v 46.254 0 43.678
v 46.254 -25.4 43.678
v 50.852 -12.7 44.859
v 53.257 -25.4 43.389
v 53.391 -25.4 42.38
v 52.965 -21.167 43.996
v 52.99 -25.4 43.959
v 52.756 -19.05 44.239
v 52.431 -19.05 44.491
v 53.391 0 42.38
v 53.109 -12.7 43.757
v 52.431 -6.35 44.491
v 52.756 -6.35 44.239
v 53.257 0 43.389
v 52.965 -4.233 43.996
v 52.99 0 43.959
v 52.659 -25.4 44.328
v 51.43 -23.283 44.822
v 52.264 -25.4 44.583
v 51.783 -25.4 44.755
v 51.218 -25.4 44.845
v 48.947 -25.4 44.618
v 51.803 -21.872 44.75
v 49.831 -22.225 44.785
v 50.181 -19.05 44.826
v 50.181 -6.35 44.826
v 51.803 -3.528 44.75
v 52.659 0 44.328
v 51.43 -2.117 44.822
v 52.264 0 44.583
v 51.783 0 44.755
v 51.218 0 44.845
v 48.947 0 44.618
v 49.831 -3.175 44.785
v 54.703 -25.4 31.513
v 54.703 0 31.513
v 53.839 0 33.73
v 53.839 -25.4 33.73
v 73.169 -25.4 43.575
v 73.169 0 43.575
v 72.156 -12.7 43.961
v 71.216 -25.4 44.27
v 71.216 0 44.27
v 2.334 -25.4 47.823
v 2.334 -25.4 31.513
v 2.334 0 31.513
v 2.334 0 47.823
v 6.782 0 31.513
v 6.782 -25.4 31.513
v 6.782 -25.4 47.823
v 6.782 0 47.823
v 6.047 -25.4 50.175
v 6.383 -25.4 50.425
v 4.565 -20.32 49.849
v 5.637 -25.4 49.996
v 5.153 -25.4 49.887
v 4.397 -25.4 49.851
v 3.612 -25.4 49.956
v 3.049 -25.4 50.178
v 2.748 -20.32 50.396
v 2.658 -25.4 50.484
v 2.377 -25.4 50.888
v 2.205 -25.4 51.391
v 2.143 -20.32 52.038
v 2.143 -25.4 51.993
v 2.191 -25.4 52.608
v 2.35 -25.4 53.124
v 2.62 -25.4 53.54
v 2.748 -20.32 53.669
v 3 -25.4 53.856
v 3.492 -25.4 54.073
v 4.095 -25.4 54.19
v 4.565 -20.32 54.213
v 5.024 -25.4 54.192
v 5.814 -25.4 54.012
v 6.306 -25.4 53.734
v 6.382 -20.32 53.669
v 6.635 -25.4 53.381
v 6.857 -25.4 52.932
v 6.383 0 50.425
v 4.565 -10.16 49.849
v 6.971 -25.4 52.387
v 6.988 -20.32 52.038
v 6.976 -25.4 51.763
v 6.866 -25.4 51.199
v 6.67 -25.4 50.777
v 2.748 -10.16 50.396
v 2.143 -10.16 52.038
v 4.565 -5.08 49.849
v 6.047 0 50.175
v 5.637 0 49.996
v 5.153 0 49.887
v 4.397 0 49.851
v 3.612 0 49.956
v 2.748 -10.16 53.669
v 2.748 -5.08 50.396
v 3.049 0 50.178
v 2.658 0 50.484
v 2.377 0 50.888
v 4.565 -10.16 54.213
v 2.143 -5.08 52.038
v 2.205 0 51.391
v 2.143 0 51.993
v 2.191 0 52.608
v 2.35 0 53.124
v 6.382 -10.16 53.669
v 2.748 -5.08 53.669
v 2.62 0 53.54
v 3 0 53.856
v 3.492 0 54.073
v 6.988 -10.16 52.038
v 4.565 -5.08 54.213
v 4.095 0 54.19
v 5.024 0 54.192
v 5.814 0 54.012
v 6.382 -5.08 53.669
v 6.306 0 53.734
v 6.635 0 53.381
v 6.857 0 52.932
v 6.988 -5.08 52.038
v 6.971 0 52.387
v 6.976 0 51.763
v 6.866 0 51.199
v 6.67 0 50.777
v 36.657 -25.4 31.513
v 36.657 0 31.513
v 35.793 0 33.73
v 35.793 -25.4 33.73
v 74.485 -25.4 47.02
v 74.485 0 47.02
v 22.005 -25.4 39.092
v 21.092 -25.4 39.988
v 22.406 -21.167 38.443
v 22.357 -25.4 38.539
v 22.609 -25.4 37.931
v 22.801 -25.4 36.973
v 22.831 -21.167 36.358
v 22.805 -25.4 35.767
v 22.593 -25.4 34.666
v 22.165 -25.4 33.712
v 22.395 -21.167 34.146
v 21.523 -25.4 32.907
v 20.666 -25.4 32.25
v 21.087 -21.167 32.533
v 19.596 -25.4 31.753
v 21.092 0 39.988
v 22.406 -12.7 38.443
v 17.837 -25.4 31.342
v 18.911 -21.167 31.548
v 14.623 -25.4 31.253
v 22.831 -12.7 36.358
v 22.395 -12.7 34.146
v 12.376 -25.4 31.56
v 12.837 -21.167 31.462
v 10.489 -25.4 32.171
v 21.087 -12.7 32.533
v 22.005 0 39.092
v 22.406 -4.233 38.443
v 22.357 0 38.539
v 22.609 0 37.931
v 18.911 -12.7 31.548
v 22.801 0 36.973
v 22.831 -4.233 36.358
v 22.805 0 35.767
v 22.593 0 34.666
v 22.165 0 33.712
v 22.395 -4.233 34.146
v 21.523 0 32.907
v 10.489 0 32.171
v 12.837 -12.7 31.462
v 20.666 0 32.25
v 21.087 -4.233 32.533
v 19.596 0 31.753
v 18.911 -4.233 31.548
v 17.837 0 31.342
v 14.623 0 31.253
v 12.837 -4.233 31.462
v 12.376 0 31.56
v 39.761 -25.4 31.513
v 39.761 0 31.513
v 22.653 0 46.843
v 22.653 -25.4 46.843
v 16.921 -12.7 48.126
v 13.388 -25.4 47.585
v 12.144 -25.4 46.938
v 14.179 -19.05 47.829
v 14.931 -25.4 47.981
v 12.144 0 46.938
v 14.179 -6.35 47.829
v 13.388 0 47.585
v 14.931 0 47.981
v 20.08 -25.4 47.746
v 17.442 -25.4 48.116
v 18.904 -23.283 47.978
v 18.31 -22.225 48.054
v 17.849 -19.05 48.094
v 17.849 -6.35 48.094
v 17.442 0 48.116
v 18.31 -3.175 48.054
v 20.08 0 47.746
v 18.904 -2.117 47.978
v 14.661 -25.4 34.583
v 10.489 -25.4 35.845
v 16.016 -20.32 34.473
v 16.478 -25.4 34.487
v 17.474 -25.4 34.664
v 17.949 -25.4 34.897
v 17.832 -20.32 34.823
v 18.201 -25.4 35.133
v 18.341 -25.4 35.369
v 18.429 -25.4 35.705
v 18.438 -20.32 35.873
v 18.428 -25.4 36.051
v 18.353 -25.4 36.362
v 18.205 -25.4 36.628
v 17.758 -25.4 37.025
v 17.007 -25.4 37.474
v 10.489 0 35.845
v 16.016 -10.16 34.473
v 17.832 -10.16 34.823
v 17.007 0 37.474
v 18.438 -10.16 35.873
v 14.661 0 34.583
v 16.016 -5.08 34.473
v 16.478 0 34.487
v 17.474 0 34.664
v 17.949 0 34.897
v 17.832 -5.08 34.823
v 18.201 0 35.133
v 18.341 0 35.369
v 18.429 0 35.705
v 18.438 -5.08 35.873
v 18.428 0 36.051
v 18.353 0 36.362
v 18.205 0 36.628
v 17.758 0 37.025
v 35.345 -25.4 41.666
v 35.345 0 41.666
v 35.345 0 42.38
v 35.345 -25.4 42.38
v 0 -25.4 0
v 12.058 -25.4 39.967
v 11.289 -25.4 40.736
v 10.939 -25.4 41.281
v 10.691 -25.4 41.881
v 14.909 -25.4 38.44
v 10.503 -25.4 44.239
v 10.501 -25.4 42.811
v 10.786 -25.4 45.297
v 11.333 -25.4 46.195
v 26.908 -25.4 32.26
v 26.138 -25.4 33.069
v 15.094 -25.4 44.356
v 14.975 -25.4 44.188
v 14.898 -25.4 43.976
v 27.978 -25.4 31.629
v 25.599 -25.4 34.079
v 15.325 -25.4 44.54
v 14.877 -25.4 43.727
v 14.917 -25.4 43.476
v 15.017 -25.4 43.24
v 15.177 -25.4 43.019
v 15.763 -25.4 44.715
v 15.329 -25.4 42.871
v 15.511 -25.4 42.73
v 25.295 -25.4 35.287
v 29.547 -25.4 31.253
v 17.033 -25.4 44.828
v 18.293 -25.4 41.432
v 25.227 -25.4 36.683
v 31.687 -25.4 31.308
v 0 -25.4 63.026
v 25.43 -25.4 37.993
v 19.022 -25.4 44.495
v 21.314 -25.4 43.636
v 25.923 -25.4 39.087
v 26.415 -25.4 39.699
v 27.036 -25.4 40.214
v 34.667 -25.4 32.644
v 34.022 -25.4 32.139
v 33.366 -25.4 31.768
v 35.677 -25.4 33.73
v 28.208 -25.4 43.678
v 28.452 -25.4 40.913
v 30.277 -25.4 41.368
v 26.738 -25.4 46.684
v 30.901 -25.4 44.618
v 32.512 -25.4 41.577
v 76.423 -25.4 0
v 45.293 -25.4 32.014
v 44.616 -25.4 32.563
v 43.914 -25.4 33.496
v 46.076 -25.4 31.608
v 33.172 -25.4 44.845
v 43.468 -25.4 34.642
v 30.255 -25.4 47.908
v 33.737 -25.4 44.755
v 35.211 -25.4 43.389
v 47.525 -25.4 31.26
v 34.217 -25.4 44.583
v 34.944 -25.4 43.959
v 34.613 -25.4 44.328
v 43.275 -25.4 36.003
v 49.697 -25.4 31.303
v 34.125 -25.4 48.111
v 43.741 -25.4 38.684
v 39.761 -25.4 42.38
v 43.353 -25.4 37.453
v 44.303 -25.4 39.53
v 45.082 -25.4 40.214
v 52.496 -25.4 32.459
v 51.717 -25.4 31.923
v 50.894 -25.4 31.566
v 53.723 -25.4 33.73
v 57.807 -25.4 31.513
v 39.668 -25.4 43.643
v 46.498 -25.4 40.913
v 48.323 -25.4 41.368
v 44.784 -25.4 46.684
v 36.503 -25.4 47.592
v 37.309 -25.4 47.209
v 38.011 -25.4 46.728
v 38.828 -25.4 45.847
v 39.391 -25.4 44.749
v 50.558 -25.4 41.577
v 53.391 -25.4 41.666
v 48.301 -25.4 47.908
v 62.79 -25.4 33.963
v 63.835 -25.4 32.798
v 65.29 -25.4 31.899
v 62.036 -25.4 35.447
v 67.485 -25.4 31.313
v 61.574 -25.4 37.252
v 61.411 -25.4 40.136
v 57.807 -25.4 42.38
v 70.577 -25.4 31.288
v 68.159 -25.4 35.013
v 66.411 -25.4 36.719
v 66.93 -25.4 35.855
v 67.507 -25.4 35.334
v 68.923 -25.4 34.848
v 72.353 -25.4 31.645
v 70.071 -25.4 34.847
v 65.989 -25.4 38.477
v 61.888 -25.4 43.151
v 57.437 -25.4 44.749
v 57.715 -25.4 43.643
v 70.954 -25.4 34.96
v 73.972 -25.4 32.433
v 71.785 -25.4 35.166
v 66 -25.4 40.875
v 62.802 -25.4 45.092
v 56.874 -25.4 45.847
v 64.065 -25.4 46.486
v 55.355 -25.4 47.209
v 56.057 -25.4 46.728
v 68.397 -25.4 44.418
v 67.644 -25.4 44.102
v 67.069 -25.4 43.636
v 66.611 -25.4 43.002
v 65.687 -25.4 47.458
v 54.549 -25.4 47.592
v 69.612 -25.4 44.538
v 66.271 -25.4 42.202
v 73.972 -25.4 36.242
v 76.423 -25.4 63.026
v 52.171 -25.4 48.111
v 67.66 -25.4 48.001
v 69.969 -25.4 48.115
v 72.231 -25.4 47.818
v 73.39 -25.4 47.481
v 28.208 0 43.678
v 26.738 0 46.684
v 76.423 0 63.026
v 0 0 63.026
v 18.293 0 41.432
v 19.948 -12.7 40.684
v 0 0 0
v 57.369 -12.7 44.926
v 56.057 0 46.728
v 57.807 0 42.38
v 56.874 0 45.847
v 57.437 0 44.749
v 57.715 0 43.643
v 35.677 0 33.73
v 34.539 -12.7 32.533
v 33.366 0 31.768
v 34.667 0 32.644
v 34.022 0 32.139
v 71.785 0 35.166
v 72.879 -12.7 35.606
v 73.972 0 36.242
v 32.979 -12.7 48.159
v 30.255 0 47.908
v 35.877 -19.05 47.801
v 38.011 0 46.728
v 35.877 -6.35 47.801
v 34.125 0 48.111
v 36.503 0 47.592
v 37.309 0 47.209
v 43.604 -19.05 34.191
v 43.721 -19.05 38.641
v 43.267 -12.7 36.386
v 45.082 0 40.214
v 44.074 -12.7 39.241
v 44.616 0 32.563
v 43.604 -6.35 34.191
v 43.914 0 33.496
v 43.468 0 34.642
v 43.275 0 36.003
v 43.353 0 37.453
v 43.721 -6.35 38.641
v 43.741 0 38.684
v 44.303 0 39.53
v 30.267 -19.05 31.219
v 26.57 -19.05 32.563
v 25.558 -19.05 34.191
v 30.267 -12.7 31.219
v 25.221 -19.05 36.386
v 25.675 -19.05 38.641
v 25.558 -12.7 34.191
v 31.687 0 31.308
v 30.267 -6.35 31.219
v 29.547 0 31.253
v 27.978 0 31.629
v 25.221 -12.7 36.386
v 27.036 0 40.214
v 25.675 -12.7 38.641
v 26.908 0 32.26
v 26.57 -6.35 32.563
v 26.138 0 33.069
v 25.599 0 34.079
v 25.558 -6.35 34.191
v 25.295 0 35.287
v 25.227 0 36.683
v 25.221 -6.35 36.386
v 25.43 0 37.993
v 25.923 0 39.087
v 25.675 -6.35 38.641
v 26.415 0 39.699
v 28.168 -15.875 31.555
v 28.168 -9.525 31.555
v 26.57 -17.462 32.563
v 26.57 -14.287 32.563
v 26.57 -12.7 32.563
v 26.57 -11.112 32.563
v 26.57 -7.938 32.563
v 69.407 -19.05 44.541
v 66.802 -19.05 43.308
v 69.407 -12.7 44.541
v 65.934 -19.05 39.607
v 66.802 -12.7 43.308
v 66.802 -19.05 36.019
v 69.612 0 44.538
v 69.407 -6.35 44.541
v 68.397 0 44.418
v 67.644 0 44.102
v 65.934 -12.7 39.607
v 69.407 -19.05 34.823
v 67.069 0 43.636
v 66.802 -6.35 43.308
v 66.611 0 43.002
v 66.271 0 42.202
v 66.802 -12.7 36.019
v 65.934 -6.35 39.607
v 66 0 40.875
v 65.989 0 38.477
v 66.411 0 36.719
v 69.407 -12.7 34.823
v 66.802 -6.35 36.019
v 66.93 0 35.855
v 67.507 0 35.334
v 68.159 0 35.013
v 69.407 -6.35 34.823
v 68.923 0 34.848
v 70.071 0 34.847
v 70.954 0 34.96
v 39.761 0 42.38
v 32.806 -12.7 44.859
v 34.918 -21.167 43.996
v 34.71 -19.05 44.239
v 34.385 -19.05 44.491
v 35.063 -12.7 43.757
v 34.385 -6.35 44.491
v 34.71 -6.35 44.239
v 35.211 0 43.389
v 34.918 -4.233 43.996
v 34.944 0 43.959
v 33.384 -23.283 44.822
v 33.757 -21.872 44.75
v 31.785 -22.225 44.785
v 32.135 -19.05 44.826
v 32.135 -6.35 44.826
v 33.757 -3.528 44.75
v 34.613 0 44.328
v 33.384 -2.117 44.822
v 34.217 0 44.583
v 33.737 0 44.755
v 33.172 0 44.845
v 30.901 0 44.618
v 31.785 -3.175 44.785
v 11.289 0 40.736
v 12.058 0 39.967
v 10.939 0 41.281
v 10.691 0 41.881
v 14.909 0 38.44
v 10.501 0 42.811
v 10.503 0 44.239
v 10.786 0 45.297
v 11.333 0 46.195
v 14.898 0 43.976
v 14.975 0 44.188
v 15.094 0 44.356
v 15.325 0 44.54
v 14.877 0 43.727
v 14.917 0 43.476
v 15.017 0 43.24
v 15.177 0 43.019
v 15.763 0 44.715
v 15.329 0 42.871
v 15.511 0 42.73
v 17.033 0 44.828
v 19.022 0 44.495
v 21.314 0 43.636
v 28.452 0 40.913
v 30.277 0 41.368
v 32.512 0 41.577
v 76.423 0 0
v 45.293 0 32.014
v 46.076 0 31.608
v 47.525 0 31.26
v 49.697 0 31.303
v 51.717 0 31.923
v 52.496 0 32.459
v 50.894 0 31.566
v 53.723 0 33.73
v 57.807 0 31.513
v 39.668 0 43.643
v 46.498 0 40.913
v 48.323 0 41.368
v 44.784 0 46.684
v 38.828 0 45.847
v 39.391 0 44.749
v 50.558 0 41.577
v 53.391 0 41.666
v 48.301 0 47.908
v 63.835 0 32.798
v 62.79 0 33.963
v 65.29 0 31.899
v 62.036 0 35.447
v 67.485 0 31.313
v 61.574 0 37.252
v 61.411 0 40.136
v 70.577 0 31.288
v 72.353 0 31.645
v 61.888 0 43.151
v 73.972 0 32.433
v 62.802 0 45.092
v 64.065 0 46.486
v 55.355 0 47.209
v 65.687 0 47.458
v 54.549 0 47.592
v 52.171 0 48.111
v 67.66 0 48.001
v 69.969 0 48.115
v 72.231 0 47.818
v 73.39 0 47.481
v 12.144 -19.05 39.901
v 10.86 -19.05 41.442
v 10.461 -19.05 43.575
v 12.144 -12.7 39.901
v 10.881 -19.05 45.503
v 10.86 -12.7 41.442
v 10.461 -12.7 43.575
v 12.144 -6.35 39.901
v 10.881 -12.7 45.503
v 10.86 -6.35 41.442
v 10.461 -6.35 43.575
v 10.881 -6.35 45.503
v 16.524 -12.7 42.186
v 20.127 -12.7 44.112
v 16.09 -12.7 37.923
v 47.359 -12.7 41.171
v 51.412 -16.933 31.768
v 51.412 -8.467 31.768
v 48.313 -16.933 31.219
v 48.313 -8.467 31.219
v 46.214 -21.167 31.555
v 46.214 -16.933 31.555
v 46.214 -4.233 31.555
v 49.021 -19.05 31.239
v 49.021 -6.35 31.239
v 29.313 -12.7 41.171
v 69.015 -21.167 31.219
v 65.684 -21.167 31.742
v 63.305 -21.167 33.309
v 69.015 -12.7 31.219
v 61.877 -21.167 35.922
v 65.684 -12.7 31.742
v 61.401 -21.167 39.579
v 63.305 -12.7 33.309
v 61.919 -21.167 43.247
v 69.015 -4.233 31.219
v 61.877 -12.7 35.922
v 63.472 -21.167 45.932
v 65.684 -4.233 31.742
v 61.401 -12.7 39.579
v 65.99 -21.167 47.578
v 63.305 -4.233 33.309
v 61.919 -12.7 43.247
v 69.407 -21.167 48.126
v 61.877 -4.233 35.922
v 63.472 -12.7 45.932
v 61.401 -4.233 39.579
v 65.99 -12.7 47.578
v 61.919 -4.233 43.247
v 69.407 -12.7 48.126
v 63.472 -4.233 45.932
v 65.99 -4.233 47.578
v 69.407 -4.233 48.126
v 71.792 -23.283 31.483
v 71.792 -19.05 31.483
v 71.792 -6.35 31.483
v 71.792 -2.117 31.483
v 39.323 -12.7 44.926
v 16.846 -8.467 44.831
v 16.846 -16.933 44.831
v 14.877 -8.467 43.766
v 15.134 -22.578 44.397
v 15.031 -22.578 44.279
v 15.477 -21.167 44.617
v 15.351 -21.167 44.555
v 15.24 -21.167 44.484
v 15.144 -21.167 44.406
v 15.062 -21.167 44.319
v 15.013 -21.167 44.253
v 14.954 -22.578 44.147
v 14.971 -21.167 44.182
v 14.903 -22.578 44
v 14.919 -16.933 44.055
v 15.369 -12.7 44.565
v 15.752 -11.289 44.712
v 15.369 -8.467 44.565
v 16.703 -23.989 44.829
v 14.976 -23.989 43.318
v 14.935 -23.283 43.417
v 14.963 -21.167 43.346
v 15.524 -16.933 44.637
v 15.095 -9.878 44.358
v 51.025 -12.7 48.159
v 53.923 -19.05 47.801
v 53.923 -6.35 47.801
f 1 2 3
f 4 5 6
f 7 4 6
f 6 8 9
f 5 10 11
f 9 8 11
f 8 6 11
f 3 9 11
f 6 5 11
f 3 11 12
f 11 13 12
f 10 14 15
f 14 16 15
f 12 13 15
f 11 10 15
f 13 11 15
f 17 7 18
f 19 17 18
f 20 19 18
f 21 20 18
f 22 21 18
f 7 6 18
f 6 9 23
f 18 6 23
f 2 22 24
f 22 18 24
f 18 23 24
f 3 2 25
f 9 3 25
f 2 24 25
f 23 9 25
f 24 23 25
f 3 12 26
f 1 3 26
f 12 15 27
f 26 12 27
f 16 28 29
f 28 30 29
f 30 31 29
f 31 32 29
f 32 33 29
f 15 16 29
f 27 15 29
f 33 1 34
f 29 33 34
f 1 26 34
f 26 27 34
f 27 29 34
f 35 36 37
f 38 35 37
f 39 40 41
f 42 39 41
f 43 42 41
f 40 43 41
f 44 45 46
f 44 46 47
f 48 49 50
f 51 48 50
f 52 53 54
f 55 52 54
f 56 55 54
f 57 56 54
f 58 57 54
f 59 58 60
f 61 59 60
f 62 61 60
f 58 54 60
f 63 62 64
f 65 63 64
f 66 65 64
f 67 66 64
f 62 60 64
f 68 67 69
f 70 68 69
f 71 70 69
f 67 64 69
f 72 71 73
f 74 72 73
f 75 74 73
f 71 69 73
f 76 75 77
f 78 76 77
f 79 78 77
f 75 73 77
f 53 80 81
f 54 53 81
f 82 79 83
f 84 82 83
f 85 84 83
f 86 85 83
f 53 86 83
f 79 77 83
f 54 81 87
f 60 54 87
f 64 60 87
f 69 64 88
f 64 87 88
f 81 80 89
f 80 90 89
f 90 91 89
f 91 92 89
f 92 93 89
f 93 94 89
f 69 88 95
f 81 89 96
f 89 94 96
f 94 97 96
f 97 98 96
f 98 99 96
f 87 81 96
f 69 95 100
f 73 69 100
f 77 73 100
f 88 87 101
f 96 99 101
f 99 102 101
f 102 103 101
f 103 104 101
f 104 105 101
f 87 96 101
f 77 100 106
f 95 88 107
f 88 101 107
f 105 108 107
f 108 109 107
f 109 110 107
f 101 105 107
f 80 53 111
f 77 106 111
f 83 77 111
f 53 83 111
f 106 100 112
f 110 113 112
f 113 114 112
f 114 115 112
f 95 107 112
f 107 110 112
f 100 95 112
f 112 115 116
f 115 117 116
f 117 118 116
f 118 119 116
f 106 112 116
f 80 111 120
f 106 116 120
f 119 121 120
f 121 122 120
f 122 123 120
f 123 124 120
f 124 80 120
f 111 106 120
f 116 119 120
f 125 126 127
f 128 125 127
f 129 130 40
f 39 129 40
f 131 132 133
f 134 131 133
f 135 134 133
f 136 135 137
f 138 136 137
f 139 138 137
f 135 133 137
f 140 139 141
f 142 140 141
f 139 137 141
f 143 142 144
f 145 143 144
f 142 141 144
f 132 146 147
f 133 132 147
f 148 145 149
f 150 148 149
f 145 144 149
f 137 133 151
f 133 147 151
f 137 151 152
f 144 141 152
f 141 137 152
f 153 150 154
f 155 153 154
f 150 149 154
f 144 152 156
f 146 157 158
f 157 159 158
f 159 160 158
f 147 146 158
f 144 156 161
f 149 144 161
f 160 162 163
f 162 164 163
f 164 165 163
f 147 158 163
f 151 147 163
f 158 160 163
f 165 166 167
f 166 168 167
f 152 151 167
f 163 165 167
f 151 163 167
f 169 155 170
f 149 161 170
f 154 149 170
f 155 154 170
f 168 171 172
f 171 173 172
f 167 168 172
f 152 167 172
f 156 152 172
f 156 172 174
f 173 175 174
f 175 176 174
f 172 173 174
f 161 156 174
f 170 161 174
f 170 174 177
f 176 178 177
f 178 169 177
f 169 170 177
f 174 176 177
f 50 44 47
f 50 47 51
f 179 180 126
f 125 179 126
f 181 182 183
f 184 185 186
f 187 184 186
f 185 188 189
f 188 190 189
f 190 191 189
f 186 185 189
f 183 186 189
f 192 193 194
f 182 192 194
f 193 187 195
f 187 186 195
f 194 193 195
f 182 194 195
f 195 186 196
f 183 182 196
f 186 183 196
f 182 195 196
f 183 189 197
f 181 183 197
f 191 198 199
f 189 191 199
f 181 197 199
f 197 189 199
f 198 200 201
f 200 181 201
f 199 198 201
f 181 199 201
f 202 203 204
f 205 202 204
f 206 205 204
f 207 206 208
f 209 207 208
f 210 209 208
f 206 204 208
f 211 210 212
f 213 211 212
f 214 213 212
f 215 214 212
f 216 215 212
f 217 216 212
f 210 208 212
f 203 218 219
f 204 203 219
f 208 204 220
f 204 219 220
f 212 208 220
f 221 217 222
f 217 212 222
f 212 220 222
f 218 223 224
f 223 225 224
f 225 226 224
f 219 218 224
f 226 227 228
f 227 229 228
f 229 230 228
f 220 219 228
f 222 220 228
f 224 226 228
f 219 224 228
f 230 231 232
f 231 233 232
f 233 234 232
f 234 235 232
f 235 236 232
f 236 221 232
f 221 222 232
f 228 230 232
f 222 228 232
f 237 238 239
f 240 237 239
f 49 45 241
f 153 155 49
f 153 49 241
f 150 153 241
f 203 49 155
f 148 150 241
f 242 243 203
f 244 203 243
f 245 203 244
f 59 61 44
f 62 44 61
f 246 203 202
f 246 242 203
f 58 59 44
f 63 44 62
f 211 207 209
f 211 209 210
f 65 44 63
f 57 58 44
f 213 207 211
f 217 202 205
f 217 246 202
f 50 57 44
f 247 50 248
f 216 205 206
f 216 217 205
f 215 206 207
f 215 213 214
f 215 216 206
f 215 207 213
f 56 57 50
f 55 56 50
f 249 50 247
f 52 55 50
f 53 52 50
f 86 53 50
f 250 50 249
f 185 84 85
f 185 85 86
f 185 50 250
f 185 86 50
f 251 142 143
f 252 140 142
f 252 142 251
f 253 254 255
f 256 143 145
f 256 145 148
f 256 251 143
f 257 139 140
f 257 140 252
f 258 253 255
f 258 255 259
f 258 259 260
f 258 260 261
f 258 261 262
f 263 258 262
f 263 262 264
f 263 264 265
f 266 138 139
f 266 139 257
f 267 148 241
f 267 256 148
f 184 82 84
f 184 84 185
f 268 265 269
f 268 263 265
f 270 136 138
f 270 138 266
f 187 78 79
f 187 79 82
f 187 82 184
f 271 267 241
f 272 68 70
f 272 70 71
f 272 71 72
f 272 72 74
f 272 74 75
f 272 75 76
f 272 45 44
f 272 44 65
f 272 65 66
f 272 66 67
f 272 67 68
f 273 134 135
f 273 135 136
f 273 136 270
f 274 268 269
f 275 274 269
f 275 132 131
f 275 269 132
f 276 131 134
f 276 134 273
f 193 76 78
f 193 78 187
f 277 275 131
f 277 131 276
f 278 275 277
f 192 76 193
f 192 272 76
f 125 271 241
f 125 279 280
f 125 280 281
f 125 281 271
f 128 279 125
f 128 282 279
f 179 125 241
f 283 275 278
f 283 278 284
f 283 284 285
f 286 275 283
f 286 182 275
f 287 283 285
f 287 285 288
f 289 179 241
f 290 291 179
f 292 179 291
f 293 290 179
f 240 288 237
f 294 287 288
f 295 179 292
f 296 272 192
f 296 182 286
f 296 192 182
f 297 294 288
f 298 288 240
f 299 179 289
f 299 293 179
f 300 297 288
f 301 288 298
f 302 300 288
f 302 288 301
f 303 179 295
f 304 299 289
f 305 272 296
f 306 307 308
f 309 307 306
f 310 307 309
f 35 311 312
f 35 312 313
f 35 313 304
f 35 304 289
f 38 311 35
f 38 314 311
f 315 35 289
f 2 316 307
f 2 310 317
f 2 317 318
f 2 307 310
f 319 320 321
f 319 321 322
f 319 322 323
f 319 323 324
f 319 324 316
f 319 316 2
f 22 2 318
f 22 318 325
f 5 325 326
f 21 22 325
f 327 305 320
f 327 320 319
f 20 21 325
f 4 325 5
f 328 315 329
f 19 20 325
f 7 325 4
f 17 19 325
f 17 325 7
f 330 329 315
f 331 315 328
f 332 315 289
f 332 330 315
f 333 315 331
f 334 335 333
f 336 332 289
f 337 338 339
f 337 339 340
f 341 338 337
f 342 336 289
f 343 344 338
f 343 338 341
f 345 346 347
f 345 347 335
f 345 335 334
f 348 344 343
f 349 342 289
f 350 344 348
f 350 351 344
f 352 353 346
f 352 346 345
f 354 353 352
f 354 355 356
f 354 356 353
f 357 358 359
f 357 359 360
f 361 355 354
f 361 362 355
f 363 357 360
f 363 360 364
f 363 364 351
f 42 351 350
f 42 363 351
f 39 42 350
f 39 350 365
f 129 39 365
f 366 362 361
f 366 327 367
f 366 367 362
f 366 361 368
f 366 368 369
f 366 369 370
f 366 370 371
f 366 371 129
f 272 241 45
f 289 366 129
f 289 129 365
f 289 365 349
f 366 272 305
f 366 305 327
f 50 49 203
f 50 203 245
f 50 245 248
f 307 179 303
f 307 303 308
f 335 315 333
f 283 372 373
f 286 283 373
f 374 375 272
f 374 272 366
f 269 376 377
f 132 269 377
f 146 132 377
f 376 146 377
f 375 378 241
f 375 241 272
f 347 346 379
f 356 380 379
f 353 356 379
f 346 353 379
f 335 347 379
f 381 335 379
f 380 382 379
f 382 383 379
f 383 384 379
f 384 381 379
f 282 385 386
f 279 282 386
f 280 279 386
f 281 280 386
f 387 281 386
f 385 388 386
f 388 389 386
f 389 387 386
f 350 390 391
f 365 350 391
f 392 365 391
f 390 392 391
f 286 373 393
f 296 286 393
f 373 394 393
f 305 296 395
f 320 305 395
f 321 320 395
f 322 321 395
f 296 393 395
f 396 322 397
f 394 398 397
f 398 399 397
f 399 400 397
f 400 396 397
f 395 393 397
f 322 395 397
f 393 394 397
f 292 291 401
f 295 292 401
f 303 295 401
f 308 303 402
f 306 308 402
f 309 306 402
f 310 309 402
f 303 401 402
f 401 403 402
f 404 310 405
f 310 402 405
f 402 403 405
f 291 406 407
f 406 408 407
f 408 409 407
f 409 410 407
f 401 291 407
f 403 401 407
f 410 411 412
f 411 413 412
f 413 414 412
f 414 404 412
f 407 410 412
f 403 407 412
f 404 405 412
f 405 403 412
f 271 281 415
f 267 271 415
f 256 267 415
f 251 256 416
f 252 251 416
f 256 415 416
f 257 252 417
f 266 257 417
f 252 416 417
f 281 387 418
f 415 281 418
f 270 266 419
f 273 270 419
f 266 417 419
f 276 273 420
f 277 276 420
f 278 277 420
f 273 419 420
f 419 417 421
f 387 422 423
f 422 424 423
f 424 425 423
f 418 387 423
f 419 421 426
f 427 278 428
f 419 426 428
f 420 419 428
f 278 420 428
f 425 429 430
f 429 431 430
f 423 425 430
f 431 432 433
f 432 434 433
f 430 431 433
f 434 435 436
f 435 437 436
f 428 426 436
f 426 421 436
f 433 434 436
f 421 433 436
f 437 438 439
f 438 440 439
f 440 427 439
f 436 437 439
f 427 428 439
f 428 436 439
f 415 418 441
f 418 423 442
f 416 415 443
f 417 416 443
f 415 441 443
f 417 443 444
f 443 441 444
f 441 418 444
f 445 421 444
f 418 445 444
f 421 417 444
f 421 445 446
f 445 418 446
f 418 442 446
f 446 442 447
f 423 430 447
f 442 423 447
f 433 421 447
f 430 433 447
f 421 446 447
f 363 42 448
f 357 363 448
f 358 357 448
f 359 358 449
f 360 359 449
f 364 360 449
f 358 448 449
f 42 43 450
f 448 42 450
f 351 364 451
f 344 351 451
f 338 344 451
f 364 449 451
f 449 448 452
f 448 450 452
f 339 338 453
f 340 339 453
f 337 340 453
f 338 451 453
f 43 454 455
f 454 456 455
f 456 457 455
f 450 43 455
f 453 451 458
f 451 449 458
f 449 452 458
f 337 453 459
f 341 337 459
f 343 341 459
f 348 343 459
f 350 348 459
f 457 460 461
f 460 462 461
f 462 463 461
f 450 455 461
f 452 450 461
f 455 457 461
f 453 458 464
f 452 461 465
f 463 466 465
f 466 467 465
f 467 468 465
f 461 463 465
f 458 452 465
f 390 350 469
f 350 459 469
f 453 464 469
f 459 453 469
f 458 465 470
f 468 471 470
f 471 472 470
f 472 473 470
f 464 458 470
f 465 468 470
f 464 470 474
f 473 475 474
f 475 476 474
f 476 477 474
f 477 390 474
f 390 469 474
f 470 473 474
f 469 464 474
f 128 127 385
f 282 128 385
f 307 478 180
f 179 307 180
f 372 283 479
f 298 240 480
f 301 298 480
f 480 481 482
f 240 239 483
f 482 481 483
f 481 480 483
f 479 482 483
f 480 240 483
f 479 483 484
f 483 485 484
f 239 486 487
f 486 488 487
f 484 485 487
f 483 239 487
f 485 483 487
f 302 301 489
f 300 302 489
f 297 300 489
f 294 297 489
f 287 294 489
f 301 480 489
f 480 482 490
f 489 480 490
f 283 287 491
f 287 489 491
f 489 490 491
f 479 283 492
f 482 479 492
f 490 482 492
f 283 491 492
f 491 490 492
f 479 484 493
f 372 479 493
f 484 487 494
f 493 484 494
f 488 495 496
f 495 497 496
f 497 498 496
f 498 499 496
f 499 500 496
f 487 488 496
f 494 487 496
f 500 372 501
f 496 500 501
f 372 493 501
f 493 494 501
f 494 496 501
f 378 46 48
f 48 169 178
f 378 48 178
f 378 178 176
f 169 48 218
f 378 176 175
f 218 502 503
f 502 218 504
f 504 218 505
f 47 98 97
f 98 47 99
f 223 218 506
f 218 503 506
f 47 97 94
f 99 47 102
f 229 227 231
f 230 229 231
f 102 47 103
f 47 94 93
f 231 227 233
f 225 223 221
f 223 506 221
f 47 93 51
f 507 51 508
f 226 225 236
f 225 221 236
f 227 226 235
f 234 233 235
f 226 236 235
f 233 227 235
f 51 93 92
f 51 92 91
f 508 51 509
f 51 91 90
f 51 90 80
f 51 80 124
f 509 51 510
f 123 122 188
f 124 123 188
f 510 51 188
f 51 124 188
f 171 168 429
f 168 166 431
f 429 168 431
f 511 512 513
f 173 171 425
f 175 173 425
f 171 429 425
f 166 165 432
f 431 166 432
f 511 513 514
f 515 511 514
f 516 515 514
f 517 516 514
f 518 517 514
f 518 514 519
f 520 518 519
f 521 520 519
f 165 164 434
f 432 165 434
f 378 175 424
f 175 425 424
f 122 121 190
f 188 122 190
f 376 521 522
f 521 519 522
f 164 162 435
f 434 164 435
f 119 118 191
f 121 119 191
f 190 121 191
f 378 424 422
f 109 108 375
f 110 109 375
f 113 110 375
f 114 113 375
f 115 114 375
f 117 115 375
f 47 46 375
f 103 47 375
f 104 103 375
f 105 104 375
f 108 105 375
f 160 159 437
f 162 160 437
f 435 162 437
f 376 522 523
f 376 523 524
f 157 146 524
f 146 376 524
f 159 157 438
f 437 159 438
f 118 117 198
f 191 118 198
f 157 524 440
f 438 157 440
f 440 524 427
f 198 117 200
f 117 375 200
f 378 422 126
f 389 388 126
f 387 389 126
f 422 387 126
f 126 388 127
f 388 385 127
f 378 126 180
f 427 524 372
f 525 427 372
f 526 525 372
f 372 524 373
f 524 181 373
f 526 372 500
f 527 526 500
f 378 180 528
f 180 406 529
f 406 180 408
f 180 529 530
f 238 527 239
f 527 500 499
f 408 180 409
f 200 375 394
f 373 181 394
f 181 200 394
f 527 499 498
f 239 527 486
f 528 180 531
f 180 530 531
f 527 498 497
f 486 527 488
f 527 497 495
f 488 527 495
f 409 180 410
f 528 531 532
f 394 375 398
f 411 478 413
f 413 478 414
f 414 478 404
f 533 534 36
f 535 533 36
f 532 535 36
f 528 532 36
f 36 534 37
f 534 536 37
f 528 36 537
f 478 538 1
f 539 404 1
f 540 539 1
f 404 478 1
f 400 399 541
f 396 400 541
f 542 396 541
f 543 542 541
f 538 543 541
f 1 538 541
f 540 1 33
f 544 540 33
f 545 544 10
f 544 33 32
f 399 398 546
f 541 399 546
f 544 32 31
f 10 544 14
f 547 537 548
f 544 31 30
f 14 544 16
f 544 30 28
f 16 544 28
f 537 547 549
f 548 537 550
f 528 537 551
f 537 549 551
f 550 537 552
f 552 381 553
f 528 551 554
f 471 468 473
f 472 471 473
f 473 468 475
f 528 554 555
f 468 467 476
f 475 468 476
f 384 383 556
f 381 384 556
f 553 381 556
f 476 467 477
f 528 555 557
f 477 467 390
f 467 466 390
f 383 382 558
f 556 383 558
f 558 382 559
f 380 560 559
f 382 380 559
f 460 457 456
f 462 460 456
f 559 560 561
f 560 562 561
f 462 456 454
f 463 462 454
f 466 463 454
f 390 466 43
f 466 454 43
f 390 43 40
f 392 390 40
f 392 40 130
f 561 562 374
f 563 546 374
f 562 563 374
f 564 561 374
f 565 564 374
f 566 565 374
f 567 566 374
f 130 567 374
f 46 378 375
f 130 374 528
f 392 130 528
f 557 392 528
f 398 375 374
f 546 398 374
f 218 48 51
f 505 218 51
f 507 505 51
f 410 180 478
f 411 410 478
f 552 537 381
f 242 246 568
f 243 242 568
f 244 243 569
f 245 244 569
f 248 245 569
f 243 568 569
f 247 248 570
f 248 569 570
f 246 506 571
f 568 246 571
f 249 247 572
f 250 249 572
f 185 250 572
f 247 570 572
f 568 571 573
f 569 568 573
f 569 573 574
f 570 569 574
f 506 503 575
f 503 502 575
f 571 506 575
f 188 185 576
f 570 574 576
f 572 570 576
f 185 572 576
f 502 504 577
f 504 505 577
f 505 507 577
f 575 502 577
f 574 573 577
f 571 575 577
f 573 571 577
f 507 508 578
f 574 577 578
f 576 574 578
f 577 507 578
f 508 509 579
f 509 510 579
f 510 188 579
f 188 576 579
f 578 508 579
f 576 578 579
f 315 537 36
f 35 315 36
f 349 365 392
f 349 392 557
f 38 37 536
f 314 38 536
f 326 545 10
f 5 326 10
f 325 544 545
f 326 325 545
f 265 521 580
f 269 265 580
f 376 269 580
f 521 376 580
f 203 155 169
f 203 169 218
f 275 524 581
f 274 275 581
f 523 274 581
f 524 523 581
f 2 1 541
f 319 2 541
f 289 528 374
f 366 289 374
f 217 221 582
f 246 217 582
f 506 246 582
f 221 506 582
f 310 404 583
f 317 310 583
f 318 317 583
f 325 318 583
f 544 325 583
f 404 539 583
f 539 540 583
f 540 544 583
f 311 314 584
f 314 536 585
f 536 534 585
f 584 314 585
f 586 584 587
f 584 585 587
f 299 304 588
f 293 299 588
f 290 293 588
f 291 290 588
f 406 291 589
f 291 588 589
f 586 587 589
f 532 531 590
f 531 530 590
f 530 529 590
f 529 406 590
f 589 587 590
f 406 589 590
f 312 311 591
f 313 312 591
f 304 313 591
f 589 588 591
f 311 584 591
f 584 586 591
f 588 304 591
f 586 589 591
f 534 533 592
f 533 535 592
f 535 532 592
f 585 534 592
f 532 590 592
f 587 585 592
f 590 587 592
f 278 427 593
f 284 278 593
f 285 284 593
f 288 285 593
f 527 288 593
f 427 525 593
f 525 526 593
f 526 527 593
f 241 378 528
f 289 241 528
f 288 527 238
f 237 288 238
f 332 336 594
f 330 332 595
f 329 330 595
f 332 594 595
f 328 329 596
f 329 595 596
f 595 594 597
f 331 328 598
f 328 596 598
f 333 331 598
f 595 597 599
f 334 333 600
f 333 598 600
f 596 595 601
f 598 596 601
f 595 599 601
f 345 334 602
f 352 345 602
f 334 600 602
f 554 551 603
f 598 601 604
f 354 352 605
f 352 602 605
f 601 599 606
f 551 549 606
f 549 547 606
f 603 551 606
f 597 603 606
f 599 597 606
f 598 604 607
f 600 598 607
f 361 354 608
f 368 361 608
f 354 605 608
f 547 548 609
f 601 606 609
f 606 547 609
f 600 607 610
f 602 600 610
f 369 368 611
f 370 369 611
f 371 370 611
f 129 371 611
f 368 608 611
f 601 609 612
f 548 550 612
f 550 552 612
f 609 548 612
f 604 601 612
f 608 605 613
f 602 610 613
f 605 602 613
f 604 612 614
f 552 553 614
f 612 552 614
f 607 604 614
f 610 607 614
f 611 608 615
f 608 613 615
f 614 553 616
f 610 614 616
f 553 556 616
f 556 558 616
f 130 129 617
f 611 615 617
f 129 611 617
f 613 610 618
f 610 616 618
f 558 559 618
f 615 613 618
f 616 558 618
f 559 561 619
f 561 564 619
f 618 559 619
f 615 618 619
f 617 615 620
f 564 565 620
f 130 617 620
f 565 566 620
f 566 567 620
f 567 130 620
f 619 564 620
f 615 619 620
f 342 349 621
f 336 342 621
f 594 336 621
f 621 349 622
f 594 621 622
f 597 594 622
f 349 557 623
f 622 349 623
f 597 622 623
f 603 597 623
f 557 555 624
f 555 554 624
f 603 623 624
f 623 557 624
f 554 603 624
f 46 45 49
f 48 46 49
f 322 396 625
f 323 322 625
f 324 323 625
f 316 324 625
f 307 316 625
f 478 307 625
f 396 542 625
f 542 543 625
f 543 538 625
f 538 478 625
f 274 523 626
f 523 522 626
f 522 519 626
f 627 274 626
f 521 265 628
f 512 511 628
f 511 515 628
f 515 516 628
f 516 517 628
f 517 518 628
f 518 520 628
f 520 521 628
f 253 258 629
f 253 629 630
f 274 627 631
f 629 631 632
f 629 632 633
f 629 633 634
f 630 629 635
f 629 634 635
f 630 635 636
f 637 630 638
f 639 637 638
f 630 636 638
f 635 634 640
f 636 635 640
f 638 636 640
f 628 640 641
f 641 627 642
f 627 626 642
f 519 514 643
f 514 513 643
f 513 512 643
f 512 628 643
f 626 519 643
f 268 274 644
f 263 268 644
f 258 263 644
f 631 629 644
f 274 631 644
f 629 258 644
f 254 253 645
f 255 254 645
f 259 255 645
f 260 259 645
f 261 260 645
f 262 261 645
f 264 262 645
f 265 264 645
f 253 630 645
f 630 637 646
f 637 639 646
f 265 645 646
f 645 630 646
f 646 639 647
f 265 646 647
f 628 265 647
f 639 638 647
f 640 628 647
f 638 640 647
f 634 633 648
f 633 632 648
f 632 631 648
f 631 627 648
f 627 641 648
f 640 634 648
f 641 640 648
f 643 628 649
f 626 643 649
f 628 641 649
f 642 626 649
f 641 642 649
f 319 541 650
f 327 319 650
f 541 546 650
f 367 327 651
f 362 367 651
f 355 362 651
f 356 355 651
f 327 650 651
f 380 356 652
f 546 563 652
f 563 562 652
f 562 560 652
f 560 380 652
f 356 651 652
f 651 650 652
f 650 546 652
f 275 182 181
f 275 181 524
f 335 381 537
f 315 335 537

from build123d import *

# Parameters (mm, degrees)
F0_W     = 76.4226376876
F0_H     = 63.0263250266
F0_W_2   = 4.4484958292
F0_H_2   = 16.3095954117
F1_DEPTH = 25.4


with BuildPart() as f1:
    # F0 (on Front) → F1 (new body)
    with BuildSketch(Plane.XZ):
        with Locations((38.2113188438, 31.5131625133)):
            Rectangle(F0_W, F0_H)
        with Locations((4.5581911619, 39.6679602192)):
            Rectangle(F0_W_2, F0_H_2, mode=Mode.SUBTRACT)
        with BuildLine():
            add(Edge.make_bspline(
                [(22.4058551735, 38.4426400144), (22.8306328445, 37.5674112967), (22.8306328445, 36.3584286946)],
                knots=[0, 0, 0, 1, 1, 1], degree=2))
            add(Edge.make_bspline(
                [(22.8306328445, 36.3584286946), (22.8306328445, 33.8471057606), (21.0871772388, 32.5330957124)],
                knots=[0, 0, 0, 1, 1, 1], degree=2))
            add(Edge.make_bspline(
                [(21.0871772388, 32.5330957124), (19.3437216331, 31.2190856642), (15.8708140812, 31.2190856642)],
                knots=[0, 0, 0, 1, 1, 1], degree=2))
            add(Edge.make_bspline(
                [(15.8708140812, 31.2190856642), (14.0923493268, 31.2190856642), (12.8366878598, 31.4618157619)],
                knots=[0, 0, 0, 1, 1, 1], degree=2))
            add(Edge.make_bspline(
                [(12.8366878598, 31.4618157619), (11.5810263928, 31.7045458596), (10.4887409531, 32.171334509)],
                knots=[0, 0, 0, 1, 1, 1], degree=2))
            Line((10.4887409531, 32.171334509), (10.4887409531, 35.8449611802))
            add(Edge.make_bspline(
                [(10.4887409531, 35.8449611802), (11.7257308741, 35.2614753684), (13.2801370768, 34.8670389596)],
                knots=[0, 0, 0, 1, 1, 1], degree=2))
            add(Edge.make_bspline(
                [(13.2801370768, 34.8670389596), (14.8345432795, 34.4726025508), (16.0155185626, 34.4726025508)],
                knots=[0, 0, 0, 1, 1, 1], degree=2))
            add(Edge.make_bspline(
                [(16.0155185626, 34.4726025508), (18.4381516532, 34.4726025508), (18.4381516532, 35.8729684992)],
                knots=[0, 0, 0, 1, 1, 1], degree=2))
            add(Edge.make_bspline(
                [(18.4381516532, 35.8729684992), (18.4381516532, 36.400439673), (18.1160674851, 36.7295256709)],
                knots=[0, 0, 0, 1, 1, 1], degree=2))
            add(Edge.make_bspline(
                [(18.1160674851, 36.7295256709), (17.793983317, 37.0586116688), (17.0074444426, 37.4740535668)],
                knots=[0, 0, 0, 1, 1, 1], degree=2))
            add(Edge.make_bspline(
                [(17.0074444426, 37.4740535668), (16.2209055683, 37.8894954648), (14.9092294634, 38.4403060711)],
                knots=[0, 0, 0, 1, 1, 1], degree=2))
            add(Edge.make_bspline(
                [(14.9092294634, 38.4403060711), (13.0280712061, 39.2291788887), (12.1435067154, 39.9013545439)],
                knots=[0, 0, 0, 1, 1, 1], degree=2))
            add(Edge.make_bspline(
                [(12.1435067154, 39.9013545439), (11.2589422247, 40.5735301991), (10.8598379294, 41.4417570871)],
                knots=[0, 0, 0, 1, 1, 1], degree=2))
            add(Edge.make_bspline(
                [(10.8598379294, 41.4417570871), (10.4607336341, 42.3099839751), (10.4607336341, 43.5749812151)],
                knots=[0, 0, 0, 1, 1, 1], degree=2))
            add(Edge.make_bspline(
                [(10.4607336341, 43.5749812151), (10.4607336341, 45.7502163215), (12.1435067154, 46.9381934343)],
                knots=[0, 0, 0, 1, 1, 1], degree=2))
            add(Edge.make_bspline(
                [(12.1435067154, 46.9381934343), (13.8262797967, 48.1261705472), (16.9210885425, 48.1261705472)],
                knots=[0, 0, 0, 1, 1, 1], degree=2))
            add(Edge.make_bspline(
                [(16.9210885425, 48.1261705472), (19.8665249205, 48.1261705472), (22.6532531577, 46.8425017612)],
                knots=[0, 0, 0, 1, 1, 1], degree=2))
            Line((22.6532531577, 46.8425017612), (21.3135697338, 43.6356637395))
            add(Edge.make_bspline(
                [(21.3135697338, 43.6356637395), (20.0859155858, 44.1584670269), (19.021637465, 44.4945548545)],
                knots=[0, 0, 0, 1, 1, 1], degree=2))
            add(Edge.make_bspline(
                [(19.021637465, 44.4945548545), (17.9573593443, 44.8306426821), (16.8464023586, 44.8306426821)],
                knots=[0, 0, 0, 1, 1, 1], degree=2))
            add(Edge.make_bspline(
                [(16.8464023586, 44.8306426821), (14.8765542579, 44.8306426821), (14.8765542579, 43.7663645613)],
                knots=[0, 0, 0, 1, 1, 1], degree=2))
            add(Edge.make_bspline(
                [(14.8765542579, 43.7663645613), (14.8765542579, 43.16887509), (15.5113868212, 42.7300937596)],
                knots=[0, 0, 0, 1, 1, 1], degree=2))
            add(Edge.make_bspline(
                [(15.5113868212, 42.7300937596), (16.1462193844, 42.2913124291), (18.2934471719, 41.4324213141)],
                knots=[0, 0, 0, 1, 1, 1], degree=2))
            add(Edge.make_bspline(
                [(18.2934471719, 41.4324213141), (20.2026127481, 40.657552156), (21.0918451253, 39.987710444)],
                knots=[0, 0, 0, 1, 1, 1], degree=2))
            add(Edge.make_bspline(
                [(21.0918451253, 39.987710444), (21.9810775025, 39.3178687321), (22.4058551735, 38.4426400144)],
                knots=[0, 0, 0, 1, 1, 1], degree=2))
        make_face(mode=Mode.SUBTRACT)
        with BuildLine():
            Line((39.76105716, 31.5131625133), (36.6569126412, 31.5131625133))
            Line((36.6569126412, 31.5131625133), (35.7933536397, 33.7304085982))
            Line((35.7933536397, 33.7304085982), (35.6766564773, 33.7304085982))
            add(Edge.make_bspline(
                [(35.6766564773, 33.7304085982), (34.5563637186, 32.3160389904), (33.3660526625, 31.7675623273)],
                knots=[0, 0, 0, 1, 1, 1], degree=2))
            add(Edge.make_bspline(
                [(33.3660526625, 31.7675623273), (32.1757416065, 31.2190856642), (30.2665760302, 31.2190856642)],
                knots=[0, 0, 0, 1, 1, 1], degree=2))
            add(Edge.make_bspline(
                [(30.2665760302, 31.2190856642), (27.9186291235, 31.2190856642), (26.5696099266, 32.5634369746)],
                knots=[0, 0, 0, 1, 1, 1], degree=2))
            add(Edge.make_bspline(
                [(26.5696099266, 32.5634369746), (25.2205907297, 33.907788285), (25.2205907297, 36.3864360136)],
                knots=[0, 0, 0, 1, 1, 1], degree=2))
            add(Edge.make_bspline(
                [(25.2205907297, 36.3864360136), (25.2205907297, 38.9817809045), (27.036398576, 40.214102939)],
                knots=[0, 0, 0, 1, 1, 1], degree=2))
            add(Edge.make_bspline(
                [(27.036398576, 40.214102939), (28.8522064224, 41.4464249736), (32.5118294341, 41.5771257954)],
                knots=[0, 0, 0, 1, 1, 1], degree=2))
            Line((32.5118294341, 41.5771257954), (35.3452365362, 41.6658156388))
            Line((35.3452365362, 41.6658156388), (35.3452365362, 42.3800022725))
            add(Edge.make_bspline(
                [(35.3452365362, 42.3800022725), (35.3452365362, 44.858650001), (32.8059062832, 44.858650001)],
                knots=[0, 0, 0, 1, 1, 1], degree=2))
            add(Edge.make_bspline(
                [(32.8059062832, 44.858650001), (30.850061842, 44.858650001), (28.2080380861, 43.6776747179)],
                knots=[0, 0, 0, 1, 1, 1], degree=2))
            Line((28.2080380861, 43.6776747179), (26.7376538404, 46.6837936204))
            add(Edge.make_bspline(
                [(26.7376538404, 46.6837936204), (29.5523893966, 48.1588457526), (32.9786180835, 48.1588457526)],
                knots=[0, 0, 0, 1, 1, 1], degree=2))
            add(Edge.make_bspline(
                [(32.9786180835, 48.1588457526), (36.2601422891, 48.1588457526), (38.0105997246, 46.7281385421)],
                knots=[0, 0, 0, 1, 1, 1], degree=2))
            add(Edge.make_bspline(
                [(38.0105997246, 46.7281385421), (39.76105716, 45.2974313315), (39.76105716, 42.3800022725)],
                knots=[0, 0, 0, 1, 1, 1], degree=2))
            Line((39.76105716, 42.3800022725), (39.76105716, 31.5131625133))
        make_face(mode=Mode.SUBTRACT)
        with BuildLine():
            add(Edge.make_bspline(
                [(4.5651929916, 49.8486206636), (2.142559901, 49.8486206636), (2.142559901, 52.0378594296)],
                knots=[0, 0, 0, 1, 1, 1], degree=2))
            add(Edge.make_bspline(
                [(2.142559901, 52.0378594296), (2.142559901, 54.213094536), (4.5651929916, 54.213094536)],
                knots=[0, 0, 0, 1, 1, 1], degree=2))
            add(Edge.make_bspline(
                [(4.5651929916, 54.213094536), (6.9878260822, 54.213094536), (6.9878260822, 52.0378594296)],
                knots=[0, 0, 0, 1, 1, 1], degree=2))
            add(Edge.make_bspline(
                [(6.9878260822, 52.0378594296), (6.9878260822, 51.0015886278), (6.3833347812, 50.4251046457)],
                knots=[0, 0, 0, 1, 1, 1], degree=2))
            add(Edge.make_bspline(
                [(6.3833347812, 50.4251046457), (5.7788434802, 49.8486206636), (4.5651929916, 49.8486206636)],
                knots=[0, 0, 0, 1, 1, 1], degree=2))
        make_face(mode=Mode.SUBTRACT)
        with BuildLine():
            Line((57.8071063477, 31.5131625133), (54.7029618288, 31.5131625133))
            Line((54.7029618288, 31.5131625133), (53.8394028273, 33.7304085982))
            Line((53.8394028273, 33.7304085982), (53.722705665, 33.7304085982))
            add(Edge.make_bspline(
                [(53.722705665, 33.7304085982), (52.6024129063, 32.3160389904), (51.4121018502, 31.7675623273)],
                knots=[0, 0, 0, 1, 1, 1], degree=2))
            add(Edge.make_bspline(
                [(51.4121018502, 31.7675623273), (50.2217907941, 31.2190856642), (48.3126252179, 31.2190856642)],
                knots=[0, 0, 0, 1, 1, 1], degree=2))
            add(Edge.make_bspline(
                [(48.3126252179, 31.2190856642), (45.9646783112, 31.2190856642), (44.6156591142, 32.5634369746)],
                knots=[0, 0, 0, 1, 1, 1], degree=2))
            add(Edge.make_bspline(
                [(44.6156591142, 32.5634369746), (43.2666399173, 33.907788285), (43.2666399173, 36.3864360136)],
                knots=[0, 0, 0, 1, 1, 1], degree=2))
            add(Edge.make_bspline(
                [(43.2666399173, 36.3864360136), (43.2666399173, 38.9817809045), (45.0824477637, 40.214102939)],
                knots=[0, 0, 0, 1, 1, 1], degree=2))
            add(Edge.make_bspline(
                [(45.0824477637, 40.214102939), (46.89825561, 41.4464249736), (50.5578786217, 41.5771257954)],
                knots=[0, 0, 0, 1, 1, 1], degree=2))
            Line((50.5578786217, 41.5771257954), (53.3912857239, 41.6658156388))
            Line((53.3912857239, 41.6658156388), (53.3912857239, 42.3800022725))
            add(Edge.make_bspline(
                [(53.3912857239, 42.3800022725), (53.3912857239, 44.858650001), (50.8519554709, 44.858650001)],
                knots=[0, 0, 0, 1, 1, 1], degree=2))
            add(Edge.make_bspline(
                [(50.8519554709, 44.858650001), (48.8961110297, 44.858650001), (46.2540872738, 43.6776747179)],
                knots=[0, 0, 0, 1, 1, 1], degree=2))
            Line((46.2540872738, 43.6776747179), (44.783703028, 46.6837936204))
            add(Edge.make_bspline(
                [(44.783703028, 46.6837936204), (47.5984385842, 48.1588457526), (51.0246672712, 48.1588457526)],
                knots=[0, 0, 0, 1, 1, 1], degree=2))
            add(Edge.make_bspline(
                [(51.0246672712, 48.1588457526), (54.3061914768, 48.1588457526), (56.0566489122, 46.7281385421)],
                knots=[0, 0, 0, 1, 1, 1], degree=2))
            add(Edge.make_bspline(
                [(56.0566489122, 46.7281385421), (57.8071063477, 45.2974313315), (57.8071063477, 42.3800022725)],
                knots=[0, 0, 0, 1, 1, 1], degree=2))
            Line((57.8071063477, 42.3800022725), (57.8071063477, 31.5131625133))
        make_face(mode=Mode.SUBTRACT)
        with BuildLine():
            add(Edge.make_bspline(
                [(71.7920942851, 31.4828212511), (70.6904730724, 31.2190856642), (69.0147018209, 31.2190856642)],
                knots=[0, 0, 0, 1, 1, 1], degree=2))
            add(Edge.make_bspline(
                [(69.0147018209, 31.2190856642), (61.4013789484, 31.2190856642), (61.4013789484, 39.5792703758)],
                knots=[0, 0, 0, 1, 1, 1], degree=2))
            add(Edge.make_bspline(
                [(61.4013789484, 39.5792703758), (61.4013789484, 43.7383572424), (63.4715866087, 45.9322638948)],
                knots=[0, 0, 0, 1, 1, 1], degree=2))
            add(Edge.make_bspline(
                [(63.4715866087, 45.9322638948), (65.541794269, 48.1261705472), (69.4068042864, 48.1261705472)],
                knots=[0, 0, 0, 1, 1, 1], degree=2))
            add(Edge.make_bspline(
                [(69.4068042864, 48.1261705472), (72.2355435021, 48.1261705472), (74.4854647924, 47.019881448)],
                knots=[0, 0, 0, 1, 1, 1], degree=2))
            Line((74.4854647924, 47.019881448), (73.169120801, 43.5749812151))
            add(Edge.make_bspline(
                [(73.169120801, 43.5749812151), (72.1188463397, 43.9997588861), (71.215610303, 44.2704963027)],
                knots=[0, 0, 0, 1, 1, 1], degree=2))
            add(Edge.make_bspline(
                [(71.215610303, 44.2704963027), (70.3123742664, 44.5412337194), (69.4068042864, 44.5412337194)],
                knots=[0, 0, 0, 1, 1, 1], degree=2))
            add(Edge.make_bspline(
                [(69.4068042864, 44.5412337194), (65.9338967345, 44.5412337194), (65.9338967345, 39.6072776947)],
                knots=[0, 0, 0, 1, 1, 1], degree=2))
            add(Edge.make_bspline(
                [(65.9338967345, 39.6072776947), (65.9338967345, 34.8226940379), (69.4068042864, 34.8226940379)],
                knots=[0, 0, 0, 1, 1, 1], degree=2))
            add(Edge.make_bspline(
                [(69.4068042864, 34.8226940379), (70.6904730724, 34.8226940379), (71.7850924554, 35.1657836953)],
                knots=[0, 0, 0, 1, 1, 1], degree=2))
            add(Edge.make_bspline(
                [(71.7850924554, 35.1657836953), (72.8797118383, 35.5088733526), (73.971997278, 36.2417315322)],
                knots=[0, 0, 0, 1, 1, 1], degree=2))
            Line((73.971997278, 36.2417315322), (73.971997278, 32.4327361527))
            add(Edge.make_bspline(
                [(73.971997278, 32.4327361527), (72.8937154978, 31.746556838), (71.7920942851, 31.4828212511)],
                knots=[0, 0, 0, 1, 1, 1], degree=2))
        make_face(mode=Mode.SUBTRACT)
    extrude(amount=F1_DEPTH)


solid = f1.part
